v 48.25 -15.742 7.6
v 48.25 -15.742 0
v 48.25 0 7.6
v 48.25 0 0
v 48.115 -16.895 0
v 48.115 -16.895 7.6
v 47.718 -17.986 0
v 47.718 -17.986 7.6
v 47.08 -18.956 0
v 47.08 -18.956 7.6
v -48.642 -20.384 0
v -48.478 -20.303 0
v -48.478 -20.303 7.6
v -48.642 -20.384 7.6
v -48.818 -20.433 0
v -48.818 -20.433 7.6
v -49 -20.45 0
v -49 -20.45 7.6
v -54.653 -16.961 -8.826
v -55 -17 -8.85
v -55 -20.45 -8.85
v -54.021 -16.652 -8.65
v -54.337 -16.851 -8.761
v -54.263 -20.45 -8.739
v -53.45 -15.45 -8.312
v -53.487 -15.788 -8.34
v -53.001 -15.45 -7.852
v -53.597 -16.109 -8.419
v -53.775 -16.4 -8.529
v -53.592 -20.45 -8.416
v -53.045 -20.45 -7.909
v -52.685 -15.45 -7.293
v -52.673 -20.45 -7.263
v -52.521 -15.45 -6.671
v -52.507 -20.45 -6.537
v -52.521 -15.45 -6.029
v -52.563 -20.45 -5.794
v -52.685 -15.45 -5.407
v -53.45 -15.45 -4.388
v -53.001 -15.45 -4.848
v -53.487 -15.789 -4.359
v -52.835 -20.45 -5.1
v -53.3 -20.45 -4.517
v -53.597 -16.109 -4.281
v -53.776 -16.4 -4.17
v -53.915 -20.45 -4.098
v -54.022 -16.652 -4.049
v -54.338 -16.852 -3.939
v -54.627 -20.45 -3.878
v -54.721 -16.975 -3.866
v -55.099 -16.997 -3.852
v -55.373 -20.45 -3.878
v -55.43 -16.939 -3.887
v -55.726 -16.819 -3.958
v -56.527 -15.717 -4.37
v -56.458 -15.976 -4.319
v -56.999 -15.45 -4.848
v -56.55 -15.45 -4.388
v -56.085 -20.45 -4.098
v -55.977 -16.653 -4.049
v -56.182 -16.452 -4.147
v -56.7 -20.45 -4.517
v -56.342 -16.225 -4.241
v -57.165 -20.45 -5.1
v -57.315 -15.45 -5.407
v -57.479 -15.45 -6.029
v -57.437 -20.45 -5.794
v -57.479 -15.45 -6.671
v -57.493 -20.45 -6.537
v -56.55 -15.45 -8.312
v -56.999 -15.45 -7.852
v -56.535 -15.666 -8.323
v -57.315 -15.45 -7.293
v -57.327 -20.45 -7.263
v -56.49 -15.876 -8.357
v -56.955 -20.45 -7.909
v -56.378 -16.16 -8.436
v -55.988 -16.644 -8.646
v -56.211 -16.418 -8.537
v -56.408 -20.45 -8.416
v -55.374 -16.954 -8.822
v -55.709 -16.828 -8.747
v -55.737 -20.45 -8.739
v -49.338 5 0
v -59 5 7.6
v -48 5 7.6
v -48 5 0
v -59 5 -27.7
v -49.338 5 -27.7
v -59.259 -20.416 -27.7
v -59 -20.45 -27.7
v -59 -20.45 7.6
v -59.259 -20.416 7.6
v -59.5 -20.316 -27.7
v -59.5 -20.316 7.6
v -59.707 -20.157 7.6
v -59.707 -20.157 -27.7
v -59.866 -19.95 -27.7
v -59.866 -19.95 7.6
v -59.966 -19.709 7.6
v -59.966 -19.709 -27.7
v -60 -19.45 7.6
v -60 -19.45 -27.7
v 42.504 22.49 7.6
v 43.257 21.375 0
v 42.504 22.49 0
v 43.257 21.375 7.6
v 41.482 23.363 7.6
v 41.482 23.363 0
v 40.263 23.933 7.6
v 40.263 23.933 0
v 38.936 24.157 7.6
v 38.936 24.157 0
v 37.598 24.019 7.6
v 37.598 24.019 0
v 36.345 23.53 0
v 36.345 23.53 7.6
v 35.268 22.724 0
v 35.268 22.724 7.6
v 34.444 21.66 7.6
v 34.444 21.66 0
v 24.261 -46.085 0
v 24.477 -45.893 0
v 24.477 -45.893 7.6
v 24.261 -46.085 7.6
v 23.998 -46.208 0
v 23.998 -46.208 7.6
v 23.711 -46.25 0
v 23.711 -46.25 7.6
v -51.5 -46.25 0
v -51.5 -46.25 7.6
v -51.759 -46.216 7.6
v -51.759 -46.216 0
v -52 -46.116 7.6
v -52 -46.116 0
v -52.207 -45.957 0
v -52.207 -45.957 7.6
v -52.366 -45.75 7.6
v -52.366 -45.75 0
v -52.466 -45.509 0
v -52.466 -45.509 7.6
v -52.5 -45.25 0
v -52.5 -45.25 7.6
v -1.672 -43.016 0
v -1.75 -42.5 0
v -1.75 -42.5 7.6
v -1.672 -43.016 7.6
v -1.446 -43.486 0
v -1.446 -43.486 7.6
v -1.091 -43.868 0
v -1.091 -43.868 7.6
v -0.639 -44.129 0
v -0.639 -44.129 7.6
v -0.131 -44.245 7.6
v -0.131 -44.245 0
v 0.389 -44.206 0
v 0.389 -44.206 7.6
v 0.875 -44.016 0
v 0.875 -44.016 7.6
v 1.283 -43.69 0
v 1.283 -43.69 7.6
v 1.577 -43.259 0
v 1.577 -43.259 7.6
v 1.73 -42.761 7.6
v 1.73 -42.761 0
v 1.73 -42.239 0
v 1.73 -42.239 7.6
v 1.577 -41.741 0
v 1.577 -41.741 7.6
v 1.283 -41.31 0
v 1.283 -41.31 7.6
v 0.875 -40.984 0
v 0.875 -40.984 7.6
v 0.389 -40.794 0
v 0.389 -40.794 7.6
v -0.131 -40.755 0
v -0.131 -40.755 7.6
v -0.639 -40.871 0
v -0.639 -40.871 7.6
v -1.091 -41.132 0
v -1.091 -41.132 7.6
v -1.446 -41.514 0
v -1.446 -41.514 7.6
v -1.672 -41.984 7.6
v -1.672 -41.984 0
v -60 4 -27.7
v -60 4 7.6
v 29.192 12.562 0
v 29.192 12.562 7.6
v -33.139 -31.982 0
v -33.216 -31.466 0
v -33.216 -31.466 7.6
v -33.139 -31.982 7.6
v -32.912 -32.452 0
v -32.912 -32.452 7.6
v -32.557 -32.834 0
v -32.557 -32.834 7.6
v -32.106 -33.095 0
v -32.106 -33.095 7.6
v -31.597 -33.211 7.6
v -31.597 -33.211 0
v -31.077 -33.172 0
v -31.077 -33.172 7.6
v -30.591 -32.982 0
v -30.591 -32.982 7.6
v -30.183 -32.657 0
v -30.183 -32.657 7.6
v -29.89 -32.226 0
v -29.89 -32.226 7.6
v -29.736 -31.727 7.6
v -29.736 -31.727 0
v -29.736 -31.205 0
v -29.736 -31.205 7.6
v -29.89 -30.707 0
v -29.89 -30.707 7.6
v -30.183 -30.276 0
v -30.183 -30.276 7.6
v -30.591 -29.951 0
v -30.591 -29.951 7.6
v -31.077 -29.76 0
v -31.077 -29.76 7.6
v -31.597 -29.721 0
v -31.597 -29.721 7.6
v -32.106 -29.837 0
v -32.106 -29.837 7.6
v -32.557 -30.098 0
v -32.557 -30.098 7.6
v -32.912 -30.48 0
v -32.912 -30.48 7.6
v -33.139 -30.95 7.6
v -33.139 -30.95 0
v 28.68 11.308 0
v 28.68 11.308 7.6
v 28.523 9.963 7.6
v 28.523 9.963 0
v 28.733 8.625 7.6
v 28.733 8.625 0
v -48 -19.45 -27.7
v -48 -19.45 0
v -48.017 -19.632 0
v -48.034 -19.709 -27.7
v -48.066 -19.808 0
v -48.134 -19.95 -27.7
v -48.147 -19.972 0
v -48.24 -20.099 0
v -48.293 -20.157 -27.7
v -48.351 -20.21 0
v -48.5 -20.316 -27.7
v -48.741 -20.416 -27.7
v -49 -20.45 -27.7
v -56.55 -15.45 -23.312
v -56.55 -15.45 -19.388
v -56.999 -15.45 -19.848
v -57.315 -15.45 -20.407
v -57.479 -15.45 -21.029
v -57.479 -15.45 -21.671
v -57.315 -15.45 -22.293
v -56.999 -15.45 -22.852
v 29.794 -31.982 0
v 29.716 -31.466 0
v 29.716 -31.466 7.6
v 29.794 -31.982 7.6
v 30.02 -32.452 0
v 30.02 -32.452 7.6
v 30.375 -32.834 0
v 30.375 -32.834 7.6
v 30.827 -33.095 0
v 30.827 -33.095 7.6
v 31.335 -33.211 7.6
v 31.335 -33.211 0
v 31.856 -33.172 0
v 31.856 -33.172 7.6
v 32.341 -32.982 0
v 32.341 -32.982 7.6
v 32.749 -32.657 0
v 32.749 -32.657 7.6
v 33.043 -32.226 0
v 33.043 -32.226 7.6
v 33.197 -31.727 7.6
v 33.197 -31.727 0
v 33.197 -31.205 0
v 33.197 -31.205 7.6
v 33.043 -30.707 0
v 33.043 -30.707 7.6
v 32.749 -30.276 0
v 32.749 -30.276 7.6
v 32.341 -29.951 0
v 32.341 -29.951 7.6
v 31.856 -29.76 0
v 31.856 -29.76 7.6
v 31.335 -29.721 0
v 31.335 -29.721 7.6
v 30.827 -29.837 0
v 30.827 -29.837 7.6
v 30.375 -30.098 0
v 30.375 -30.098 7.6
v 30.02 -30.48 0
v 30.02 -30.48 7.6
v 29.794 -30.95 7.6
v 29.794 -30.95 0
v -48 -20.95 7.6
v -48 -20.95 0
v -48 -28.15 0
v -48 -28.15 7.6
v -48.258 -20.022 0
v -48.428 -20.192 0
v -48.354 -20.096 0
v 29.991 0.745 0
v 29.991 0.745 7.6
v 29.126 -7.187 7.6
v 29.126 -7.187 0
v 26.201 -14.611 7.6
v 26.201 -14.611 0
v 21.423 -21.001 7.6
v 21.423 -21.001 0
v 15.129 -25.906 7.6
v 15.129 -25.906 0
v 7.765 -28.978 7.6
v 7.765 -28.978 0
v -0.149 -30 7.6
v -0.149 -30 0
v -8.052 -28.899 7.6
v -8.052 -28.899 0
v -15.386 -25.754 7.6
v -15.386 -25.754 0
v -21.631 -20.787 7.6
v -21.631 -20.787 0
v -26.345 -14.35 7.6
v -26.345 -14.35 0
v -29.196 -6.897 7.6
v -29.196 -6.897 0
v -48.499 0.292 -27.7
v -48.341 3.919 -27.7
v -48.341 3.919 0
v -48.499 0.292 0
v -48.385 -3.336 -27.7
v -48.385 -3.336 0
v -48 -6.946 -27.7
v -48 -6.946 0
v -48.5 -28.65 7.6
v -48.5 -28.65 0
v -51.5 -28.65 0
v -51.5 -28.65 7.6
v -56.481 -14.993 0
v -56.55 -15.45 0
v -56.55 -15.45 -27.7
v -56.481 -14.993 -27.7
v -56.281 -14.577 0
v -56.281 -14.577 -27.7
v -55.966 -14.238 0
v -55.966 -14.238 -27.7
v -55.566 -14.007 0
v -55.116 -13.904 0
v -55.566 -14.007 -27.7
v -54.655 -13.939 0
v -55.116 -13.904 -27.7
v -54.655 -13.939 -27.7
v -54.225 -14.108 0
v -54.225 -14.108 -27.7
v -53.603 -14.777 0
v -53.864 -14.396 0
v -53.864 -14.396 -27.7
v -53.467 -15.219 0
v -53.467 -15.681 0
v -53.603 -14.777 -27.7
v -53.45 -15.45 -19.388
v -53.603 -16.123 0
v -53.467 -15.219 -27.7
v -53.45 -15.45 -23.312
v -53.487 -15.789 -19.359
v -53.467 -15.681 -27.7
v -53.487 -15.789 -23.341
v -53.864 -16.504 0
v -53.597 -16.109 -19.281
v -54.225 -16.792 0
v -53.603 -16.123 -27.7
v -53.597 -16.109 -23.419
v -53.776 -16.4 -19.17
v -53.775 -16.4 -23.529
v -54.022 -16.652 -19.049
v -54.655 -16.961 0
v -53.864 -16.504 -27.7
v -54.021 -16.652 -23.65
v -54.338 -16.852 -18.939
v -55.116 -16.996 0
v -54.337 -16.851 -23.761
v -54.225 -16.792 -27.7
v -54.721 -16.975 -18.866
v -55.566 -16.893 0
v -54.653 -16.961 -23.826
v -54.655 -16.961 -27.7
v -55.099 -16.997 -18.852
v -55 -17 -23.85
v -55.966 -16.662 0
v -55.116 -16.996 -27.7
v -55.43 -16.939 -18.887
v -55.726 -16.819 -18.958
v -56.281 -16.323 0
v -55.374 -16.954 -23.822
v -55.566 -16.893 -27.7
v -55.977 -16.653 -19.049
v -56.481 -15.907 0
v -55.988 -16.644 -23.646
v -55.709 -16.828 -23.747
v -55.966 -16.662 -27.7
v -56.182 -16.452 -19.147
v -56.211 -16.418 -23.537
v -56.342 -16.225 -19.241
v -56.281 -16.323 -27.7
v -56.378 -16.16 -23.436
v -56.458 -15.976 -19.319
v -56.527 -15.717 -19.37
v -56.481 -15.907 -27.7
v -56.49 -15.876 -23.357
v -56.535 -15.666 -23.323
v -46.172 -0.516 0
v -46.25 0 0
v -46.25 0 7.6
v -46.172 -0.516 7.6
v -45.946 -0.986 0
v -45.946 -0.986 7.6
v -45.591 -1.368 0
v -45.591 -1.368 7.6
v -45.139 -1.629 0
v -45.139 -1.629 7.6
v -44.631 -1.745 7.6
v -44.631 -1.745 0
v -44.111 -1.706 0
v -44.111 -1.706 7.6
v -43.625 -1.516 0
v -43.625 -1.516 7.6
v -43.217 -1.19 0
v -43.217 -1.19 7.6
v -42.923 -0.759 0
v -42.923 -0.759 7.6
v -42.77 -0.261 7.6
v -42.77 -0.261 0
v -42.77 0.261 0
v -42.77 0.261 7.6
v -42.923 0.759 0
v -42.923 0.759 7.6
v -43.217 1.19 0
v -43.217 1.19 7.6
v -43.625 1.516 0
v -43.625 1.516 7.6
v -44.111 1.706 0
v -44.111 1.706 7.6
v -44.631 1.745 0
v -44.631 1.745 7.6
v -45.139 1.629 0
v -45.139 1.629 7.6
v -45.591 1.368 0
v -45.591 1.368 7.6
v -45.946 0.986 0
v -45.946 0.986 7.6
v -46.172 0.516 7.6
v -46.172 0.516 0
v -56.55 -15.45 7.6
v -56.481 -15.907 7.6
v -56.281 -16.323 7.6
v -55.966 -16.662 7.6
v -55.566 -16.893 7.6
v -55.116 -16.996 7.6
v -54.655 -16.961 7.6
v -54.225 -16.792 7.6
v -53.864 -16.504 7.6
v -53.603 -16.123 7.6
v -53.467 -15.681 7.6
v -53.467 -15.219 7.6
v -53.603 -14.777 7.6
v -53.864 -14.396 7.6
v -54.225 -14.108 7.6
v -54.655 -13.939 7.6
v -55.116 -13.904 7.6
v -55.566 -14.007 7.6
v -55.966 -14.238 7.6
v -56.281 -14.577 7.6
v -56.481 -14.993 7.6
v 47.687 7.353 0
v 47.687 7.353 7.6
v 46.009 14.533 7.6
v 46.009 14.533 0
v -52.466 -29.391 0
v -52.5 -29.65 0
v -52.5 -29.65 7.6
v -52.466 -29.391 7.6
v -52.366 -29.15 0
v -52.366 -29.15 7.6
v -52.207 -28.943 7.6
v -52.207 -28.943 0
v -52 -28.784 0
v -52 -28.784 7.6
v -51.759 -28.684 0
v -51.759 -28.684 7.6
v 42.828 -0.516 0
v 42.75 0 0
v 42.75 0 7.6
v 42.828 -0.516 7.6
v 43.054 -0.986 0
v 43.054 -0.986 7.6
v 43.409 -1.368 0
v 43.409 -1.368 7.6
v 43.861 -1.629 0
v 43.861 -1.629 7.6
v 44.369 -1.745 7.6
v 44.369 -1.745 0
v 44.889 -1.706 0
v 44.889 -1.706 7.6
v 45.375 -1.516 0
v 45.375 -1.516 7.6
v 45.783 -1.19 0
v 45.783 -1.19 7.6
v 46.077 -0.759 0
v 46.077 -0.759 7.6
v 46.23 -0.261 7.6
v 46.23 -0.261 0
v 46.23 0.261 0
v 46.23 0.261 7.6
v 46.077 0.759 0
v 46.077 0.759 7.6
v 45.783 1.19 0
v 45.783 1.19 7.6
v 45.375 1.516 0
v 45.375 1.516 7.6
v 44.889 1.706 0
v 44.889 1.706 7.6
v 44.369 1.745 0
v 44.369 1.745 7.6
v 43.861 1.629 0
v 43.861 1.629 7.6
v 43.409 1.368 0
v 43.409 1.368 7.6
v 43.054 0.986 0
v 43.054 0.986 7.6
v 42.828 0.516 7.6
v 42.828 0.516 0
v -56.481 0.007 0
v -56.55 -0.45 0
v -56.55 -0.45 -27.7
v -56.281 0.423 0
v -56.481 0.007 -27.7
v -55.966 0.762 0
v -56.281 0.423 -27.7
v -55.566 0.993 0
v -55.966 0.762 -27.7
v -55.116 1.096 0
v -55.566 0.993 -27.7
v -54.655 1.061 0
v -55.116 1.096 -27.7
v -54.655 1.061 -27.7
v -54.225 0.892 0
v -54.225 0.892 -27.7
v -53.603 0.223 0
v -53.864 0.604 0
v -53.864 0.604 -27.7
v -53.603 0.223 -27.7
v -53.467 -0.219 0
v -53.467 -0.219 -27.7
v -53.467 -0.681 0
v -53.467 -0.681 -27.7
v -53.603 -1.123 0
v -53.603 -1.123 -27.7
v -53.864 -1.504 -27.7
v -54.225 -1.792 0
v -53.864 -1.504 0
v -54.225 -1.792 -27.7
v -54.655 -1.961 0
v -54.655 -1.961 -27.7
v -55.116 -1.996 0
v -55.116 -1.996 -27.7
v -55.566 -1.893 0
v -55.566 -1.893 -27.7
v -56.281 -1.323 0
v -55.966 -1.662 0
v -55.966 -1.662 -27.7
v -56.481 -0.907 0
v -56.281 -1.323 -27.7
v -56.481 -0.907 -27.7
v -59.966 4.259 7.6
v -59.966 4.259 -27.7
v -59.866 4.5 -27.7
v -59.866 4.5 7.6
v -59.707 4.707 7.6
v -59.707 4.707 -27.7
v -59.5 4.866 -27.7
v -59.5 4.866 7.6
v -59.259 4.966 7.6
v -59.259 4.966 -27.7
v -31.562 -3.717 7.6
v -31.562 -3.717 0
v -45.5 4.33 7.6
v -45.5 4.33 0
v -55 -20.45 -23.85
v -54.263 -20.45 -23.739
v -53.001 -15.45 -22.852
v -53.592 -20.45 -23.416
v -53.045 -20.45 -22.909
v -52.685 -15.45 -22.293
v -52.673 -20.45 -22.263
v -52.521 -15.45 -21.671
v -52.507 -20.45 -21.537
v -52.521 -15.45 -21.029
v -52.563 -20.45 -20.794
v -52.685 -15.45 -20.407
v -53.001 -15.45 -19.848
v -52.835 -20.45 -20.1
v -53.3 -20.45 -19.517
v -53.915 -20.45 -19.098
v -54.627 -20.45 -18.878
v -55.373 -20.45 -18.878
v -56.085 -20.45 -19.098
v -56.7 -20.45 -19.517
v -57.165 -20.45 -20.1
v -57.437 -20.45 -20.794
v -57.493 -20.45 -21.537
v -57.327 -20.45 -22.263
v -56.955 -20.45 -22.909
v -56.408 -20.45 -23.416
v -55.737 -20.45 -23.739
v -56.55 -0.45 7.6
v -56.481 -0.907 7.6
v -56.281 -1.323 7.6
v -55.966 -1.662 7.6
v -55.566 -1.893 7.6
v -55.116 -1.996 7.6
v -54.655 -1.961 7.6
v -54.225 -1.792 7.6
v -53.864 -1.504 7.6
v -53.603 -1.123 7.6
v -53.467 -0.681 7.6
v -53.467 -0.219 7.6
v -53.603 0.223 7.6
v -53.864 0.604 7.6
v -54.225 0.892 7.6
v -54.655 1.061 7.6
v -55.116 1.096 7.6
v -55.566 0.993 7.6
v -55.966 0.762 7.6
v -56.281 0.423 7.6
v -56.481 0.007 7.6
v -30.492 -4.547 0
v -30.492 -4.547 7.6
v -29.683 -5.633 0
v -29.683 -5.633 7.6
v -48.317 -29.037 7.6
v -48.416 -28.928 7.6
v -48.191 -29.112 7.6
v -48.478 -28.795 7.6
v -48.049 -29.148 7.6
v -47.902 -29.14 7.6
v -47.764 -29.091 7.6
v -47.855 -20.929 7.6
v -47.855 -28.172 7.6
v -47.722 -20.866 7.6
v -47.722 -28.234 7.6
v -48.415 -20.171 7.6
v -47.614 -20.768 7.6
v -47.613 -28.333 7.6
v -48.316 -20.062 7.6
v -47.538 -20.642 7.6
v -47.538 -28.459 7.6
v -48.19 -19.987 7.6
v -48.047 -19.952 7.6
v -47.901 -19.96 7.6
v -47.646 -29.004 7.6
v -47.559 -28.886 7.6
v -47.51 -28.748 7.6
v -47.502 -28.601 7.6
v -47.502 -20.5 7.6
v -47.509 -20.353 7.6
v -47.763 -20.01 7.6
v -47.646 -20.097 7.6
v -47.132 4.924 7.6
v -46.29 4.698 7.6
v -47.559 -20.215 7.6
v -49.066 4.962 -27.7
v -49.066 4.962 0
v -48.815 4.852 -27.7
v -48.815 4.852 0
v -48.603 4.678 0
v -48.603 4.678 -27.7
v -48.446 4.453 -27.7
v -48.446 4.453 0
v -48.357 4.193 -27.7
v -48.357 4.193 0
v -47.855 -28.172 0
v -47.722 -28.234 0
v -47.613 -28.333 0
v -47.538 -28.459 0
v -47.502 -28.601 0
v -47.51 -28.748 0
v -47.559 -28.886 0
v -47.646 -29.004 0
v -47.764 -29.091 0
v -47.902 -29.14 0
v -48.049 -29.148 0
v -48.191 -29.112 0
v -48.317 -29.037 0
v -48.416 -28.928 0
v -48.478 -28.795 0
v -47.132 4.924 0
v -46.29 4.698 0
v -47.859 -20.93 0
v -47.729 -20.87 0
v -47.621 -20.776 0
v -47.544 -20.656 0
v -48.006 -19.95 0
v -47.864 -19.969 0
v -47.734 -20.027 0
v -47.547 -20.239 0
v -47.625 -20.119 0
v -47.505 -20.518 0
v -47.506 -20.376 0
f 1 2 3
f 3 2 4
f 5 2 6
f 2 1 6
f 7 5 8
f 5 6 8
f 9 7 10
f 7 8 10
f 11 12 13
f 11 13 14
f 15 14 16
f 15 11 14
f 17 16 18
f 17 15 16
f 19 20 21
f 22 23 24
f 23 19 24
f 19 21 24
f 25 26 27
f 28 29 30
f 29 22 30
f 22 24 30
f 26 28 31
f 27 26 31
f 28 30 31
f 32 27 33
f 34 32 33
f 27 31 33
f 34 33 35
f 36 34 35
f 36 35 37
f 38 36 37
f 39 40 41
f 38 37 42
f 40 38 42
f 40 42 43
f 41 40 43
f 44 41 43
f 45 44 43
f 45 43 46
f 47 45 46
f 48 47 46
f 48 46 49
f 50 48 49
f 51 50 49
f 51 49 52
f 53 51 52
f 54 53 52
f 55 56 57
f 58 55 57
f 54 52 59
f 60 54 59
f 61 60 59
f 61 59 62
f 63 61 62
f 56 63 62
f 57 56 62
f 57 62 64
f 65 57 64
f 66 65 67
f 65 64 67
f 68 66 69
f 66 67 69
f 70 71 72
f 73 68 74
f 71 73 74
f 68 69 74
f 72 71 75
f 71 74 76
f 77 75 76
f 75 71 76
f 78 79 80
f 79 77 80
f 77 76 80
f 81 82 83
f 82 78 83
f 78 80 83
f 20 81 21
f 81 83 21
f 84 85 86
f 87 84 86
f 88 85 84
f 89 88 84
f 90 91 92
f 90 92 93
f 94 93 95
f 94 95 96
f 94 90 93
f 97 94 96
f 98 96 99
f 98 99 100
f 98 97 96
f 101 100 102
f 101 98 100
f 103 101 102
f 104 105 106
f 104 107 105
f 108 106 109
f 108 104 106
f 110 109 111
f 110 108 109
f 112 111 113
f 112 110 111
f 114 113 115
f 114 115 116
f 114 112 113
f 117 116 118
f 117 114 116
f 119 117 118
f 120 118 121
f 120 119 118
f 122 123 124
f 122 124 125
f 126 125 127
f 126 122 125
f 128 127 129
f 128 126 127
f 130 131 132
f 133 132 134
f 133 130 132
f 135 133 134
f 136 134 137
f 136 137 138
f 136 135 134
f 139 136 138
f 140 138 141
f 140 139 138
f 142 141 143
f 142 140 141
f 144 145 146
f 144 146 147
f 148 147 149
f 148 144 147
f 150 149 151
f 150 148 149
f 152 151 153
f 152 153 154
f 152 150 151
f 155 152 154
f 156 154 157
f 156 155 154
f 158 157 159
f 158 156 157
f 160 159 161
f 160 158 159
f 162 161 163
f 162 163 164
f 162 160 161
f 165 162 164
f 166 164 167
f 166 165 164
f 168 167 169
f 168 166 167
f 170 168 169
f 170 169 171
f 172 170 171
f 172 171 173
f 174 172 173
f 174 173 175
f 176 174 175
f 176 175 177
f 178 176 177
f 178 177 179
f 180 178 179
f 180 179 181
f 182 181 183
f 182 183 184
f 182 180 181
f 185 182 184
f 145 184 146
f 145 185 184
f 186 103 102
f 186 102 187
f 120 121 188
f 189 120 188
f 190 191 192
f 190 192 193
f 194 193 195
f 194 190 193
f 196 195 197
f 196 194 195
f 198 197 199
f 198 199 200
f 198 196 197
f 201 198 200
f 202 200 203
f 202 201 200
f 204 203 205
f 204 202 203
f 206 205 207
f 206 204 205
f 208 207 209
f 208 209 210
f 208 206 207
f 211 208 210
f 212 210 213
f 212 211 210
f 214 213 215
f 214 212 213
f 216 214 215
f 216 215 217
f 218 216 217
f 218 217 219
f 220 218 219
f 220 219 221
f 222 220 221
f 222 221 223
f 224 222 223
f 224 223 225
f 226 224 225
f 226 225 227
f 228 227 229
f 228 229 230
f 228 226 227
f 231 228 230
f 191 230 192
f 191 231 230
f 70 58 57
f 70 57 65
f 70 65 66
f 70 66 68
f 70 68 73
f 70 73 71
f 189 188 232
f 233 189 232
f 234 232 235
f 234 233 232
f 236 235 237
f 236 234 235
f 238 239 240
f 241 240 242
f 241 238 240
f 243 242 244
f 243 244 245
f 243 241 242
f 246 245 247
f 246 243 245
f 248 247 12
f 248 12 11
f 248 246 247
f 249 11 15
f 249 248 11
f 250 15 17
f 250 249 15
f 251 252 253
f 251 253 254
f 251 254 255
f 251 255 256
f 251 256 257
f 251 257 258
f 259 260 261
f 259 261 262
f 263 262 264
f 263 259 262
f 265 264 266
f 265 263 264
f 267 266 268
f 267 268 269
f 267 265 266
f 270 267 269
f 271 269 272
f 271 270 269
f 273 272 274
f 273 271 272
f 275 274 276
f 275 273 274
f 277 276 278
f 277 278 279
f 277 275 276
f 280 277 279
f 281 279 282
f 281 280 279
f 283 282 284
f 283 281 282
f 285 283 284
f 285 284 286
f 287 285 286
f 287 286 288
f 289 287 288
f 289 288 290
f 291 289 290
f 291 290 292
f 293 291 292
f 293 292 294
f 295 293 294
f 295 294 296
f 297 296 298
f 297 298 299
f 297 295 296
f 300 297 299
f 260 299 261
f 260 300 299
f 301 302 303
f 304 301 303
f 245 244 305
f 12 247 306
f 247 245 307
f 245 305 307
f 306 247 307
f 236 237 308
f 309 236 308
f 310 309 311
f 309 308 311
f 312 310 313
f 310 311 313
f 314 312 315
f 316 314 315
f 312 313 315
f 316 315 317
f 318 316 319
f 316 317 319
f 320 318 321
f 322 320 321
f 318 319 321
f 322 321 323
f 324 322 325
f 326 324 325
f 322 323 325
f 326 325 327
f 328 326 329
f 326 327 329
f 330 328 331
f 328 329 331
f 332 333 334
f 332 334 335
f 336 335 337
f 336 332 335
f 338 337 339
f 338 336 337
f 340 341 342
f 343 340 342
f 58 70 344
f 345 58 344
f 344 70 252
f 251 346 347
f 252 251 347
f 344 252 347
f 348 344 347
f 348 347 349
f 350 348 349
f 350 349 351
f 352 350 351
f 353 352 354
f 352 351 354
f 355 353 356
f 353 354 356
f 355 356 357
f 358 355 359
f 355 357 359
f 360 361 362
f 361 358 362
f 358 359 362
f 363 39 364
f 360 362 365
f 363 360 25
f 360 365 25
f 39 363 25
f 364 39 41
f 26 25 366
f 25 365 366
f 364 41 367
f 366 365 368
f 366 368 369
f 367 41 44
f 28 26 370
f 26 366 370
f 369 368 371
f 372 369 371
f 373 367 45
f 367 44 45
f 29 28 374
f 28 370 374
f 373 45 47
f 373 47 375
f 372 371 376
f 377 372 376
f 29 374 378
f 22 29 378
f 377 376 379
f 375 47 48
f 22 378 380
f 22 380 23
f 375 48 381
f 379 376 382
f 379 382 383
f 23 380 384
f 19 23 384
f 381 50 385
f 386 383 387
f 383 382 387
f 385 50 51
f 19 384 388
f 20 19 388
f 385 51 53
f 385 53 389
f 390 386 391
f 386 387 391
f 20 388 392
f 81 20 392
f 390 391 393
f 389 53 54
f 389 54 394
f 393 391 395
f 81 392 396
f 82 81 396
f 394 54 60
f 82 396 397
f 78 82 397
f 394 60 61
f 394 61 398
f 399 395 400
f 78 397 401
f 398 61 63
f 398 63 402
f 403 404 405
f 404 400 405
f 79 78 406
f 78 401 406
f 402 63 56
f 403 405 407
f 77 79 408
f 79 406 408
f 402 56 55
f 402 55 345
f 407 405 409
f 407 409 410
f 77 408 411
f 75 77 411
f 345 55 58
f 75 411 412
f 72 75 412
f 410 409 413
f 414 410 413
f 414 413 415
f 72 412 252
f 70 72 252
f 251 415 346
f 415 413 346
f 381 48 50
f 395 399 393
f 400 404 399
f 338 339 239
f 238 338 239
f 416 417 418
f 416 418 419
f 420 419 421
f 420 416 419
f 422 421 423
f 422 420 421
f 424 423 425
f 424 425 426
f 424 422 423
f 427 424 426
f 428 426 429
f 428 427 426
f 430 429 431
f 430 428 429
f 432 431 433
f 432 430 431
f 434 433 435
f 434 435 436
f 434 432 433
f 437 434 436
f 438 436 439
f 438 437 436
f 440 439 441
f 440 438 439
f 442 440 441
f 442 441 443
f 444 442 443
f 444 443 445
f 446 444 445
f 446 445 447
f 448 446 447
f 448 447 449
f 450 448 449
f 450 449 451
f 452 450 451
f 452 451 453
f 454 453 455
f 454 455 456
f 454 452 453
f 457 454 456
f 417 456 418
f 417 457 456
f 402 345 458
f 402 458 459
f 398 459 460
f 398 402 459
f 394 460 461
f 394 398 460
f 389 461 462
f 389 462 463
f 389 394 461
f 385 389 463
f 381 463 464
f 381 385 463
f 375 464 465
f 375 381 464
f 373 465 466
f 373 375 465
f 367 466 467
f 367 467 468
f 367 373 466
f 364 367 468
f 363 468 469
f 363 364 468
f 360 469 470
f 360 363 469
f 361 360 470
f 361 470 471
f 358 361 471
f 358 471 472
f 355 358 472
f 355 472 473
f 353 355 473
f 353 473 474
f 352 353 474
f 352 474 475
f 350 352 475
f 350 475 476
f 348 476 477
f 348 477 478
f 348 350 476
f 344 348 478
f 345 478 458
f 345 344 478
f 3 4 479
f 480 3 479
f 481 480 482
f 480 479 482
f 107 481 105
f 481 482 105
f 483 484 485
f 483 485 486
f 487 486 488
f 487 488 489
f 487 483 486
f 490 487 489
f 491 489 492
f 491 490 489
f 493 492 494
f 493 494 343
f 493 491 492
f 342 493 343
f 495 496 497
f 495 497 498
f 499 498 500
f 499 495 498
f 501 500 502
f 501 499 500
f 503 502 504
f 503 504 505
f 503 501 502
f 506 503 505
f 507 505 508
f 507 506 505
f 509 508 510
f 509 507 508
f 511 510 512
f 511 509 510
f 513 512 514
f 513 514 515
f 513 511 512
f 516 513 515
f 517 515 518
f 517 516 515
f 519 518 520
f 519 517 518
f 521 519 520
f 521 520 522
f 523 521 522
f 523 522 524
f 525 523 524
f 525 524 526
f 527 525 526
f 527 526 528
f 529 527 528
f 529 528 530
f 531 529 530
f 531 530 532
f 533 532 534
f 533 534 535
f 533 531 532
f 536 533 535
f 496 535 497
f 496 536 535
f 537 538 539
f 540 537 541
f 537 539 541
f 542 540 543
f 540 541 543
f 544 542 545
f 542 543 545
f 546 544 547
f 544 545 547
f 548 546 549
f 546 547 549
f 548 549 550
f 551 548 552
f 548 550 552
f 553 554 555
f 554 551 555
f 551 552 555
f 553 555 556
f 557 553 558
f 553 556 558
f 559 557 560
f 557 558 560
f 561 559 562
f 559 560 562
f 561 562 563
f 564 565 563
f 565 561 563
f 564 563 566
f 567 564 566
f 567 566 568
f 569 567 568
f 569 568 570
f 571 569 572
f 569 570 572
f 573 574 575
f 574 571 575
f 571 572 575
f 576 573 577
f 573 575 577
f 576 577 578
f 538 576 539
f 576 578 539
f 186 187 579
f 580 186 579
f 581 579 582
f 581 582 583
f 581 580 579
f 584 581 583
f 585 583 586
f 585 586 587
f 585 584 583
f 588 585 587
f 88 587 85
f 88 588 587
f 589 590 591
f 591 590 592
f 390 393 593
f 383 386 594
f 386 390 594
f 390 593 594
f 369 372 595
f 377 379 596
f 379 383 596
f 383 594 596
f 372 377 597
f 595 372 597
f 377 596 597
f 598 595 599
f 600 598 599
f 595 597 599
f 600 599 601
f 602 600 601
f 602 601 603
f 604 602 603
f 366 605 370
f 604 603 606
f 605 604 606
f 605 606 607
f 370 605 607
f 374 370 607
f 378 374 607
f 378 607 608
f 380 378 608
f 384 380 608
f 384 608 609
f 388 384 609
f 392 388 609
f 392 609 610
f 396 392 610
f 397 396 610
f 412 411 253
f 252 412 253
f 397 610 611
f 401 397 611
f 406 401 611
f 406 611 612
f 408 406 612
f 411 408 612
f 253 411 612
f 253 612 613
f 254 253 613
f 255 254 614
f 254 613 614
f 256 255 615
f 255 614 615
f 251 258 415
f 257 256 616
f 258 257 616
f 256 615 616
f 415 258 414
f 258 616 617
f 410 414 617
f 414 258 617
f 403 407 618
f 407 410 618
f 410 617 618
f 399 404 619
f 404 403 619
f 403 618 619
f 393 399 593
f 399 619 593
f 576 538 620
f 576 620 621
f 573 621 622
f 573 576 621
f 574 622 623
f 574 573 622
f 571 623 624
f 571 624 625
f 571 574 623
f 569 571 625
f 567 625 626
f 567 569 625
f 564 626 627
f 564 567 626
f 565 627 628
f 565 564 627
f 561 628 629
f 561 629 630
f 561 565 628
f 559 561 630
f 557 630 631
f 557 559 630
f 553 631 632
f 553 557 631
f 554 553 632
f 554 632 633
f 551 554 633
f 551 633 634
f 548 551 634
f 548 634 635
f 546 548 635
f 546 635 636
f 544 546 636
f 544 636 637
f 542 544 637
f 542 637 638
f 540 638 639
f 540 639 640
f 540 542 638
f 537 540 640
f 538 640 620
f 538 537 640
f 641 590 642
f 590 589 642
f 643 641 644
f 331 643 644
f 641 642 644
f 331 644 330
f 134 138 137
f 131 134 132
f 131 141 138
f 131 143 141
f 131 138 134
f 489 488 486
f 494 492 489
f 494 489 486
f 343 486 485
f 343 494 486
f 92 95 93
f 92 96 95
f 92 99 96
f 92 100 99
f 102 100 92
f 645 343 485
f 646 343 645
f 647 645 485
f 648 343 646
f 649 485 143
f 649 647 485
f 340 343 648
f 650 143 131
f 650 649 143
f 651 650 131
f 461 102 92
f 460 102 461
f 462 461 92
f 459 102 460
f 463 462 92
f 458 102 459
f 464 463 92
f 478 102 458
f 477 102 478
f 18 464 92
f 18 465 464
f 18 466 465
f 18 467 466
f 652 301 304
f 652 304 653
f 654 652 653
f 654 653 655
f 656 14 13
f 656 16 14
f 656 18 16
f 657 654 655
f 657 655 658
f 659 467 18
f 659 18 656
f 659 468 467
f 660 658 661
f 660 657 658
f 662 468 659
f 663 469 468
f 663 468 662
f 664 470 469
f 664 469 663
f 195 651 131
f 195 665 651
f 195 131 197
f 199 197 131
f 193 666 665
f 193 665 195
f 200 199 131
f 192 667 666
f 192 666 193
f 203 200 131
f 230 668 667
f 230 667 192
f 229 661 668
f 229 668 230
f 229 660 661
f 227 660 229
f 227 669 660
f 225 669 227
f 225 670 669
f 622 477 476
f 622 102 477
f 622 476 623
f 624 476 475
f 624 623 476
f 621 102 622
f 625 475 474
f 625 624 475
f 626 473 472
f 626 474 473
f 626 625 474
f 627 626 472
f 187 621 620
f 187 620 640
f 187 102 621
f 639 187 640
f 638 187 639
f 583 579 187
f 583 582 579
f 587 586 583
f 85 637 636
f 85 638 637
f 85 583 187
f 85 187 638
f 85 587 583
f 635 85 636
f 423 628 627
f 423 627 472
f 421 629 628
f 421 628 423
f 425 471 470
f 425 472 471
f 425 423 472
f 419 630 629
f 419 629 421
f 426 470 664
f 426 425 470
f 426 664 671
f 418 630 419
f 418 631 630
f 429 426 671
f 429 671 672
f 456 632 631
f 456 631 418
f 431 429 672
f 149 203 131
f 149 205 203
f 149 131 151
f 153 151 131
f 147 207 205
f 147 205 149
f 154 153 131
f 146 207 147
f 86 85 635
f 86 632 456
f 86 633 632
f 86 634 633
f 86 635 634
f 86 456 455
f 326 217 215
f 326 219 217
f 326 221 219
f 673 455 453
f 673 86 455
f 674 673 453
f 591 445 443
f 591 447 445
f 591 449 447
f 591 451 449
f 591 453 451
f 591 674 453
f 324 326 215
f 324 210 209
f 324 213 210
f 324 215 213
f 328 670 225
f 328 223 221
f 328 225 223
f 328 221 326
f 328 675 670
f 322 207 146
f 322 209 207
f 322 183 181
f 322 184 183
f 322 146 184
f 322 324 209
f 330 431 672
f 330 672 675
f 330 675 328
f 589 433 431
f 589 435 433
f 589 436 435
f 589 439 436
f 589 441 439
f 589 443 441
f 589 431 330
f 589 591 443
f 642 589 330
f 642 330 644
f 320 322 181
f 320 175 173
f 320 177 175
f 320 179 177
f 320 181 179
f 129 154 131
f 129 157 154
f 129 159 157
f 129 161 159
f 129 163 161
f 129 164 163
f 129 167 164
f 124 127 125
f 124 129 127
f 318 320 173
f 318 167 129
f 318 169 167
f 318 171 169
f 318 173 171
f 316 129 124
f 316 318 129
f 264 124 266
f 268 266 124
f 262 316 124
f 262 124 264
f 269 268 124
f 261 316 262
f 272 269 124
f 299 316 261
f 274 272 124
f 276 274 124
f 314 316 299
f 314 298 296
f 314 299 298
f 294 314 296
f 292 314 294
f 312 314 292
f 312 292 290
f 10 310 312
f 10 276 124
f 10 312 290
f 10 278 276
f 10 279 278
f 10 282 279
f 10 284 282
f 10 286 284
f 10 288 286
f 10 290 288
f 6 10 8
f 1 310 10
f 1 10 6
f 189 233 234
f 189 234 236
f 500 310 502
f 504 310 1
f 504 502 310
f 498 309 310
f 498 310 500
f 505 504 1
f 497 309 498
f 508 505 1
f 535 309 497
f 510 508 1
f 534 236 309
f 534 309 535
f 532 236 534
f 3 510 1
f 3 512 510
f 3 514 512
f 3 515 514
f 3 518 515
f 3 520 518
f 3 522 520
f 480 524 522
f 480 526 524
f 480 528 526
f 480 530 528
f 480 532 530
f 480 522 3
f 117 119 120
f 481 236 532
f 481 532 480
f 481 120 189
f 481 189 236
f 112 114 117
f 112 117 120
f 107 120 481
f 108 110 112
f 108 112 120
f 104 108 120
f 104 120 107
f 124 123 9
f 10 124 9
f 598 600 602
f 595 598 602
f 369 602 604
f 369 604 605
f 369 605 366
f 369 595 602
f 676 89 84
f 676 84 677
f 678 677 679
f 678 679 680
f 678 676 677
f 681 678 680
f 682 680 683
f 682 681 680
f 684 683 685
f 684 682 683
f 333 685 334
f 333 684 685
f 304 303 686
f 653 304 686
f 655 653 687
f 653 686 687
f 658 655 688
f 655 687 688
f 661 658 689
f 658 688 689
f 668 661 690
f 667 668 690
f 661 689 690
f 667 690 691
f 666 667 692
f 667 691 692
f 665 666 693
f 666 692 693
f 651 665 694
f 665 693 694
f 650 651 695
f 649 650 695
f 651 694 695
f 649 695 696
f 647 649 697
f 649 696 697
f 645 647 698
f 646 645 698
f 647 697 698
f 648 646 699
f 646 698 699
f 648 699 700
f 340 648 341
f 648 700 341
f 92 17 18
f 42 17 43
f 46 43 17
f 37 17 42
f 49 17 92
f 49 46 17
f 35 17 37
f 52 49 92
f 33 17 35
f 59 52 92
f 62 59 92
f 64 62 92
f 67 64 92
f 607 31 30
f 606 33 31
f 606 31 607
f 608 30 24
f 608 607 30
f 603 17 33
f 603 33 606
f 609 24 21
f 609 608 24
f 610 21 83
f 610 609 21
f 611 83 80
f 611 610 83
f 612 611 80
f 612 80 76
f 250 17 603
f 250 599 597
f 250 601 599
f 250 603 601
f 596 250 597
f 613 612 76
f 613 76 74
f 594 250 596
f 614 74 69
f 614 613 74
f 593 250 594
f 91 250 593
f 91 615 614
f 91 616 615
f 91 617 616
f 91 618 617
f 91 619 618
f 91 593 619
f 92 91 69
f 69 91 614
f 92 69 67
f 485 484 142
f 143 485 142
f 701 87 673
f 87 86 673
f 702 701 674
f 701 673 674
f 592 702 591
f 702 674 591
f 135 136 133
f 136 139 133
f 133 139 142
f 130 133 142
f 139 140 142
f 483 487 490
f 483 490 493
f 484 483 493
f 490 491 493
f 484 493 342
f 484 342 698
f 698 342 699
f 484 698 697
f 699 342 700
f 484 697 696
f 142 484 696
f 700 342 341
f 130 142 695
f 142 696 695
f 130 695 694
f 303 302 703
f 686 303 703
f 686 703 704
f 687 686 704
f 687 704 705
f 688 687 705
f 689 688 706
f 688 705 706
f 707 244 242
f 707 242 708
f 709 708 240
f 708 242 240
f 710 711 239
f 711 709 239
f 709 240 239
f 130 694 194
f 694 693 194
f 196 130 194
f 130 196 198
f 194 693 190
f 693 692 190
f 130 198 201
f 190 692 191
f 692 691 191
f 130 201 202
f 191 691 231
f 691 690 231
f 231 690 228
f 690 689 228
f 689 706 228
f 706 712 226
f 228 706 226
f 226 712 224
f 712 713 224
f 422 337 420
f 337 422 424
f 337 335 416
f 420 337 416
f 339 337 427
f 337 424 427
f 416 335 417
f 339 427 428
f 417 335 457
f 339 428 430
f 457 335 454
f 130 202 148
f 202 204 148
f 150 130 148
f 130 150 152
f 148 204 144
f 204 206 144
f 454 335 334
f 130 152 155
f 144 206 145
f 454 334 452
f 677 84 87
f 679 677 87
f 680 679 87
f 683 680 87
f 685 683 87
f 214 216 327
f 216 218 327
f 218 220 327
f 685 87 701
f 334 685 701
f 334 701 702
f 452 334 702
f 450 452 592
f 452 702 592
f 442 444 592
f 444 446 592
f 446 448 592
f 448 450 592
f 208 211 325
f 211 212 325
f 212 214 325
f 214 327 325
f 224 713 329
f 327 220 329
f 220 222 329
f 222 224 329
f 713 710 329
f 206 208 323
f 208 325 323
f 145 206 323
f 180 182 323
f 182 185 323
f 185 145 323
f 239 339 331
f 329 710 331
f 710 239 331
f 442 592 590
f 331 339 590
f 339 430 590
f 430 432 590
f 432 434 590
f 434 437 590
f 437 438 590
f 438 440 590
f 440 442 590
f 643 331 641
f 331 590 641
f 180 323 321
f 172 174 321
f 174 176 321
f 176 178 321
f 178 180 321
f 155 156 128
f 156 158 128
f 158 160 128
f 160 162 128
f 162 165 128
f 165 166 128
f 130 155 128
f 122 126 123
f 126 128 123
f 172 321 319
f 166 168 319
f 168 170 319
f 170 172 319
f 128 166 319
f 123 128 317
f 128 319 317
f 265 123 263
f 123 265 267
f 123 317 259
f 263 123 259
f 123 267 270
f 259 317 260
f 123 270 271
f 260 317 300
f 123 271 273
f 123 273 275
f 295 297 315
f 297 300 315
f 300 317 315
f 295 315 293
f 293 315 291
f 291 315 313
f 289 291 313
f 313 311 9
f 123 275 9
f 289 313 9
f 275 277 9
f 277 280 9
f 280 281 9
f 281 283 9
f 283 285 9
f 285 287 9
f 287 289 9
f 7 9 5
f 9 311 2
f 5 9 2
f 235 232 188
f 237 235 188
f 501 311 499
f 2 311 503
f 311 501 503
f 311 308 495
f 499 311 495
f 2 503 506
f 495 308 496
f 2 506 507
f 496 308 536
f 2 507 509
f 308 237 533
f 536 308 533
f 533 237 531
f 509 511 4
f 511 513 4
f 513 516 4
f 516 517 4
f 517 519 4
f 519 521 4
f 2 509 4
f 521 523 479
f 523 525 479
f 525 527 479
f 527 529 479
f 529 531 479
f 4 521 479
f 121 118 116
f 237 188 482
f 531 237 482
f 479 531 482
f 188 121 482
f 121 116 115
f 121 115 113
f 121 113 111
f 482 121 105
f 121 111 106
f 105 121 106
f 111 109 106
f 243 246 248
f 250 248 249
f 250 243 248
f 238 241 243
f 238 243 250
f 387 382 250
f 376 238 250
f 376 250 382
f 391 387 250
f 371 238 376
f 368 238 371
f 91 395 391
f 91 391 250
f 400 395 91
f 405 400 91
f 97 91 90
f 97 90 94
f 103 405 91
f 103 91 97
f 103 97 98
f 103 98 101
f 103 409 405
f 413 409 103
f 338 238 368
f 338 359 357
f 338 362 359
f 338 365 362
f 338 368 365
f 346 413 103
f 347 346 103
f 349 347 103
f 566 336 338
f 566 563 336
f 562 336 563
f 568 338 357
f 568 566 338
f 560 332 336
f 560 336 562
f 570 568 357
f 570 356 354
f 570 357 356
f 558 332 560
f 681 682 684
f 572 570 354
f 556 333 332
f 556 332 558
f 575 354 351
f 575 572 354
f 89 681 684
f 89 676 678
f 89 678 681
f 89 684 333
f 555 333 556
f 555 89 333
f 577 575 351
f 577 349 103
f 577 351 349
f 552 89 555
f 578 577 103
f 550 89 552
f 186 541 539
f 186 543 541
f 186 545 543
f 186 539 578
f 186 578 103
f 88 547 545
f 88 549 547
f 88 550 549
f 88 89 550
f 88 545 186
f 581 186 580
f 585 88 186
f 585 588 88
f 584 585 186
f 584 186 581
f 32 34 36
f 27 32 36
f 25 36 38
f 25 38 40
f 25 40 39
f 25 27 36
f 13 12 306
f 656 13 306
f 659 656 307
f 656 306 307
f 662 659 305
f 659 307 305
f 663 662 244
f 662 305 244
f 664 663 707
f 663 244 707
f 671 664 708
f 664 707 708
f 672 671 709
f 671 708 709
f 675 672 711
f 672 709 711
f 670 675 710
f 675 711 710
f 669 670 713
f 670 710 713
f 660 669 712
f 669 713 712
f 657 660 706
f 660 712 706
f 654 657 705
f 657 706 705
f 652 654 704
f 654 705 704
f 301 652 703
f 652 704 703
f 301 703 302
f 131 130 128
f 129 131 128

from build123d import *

# Parameters (mm, degrees)
SKETCH_1_R          = 1.75
SKETCH_1_R_2        = 1.55
EXTRUDE_1_DEPTH     = 7.6
SKETCH_2_R          = 0.5
CUT_EXTRUDE_1_DEPTH = 10
FILLET_1_R          = 5
EXTRUDE_START       = 27.7
SKETCH_4_R          = 1.55
EXTRUDE_2_DEPTH     = 27.7
SKETCH_6_R          = 2.5
CUT_EXTRUDE_2_DEPTH = 5
FILLET_START        = -29
FILLET_2_DEPTH      = 29
FILLET_2_2_DEPTH    = 9


with BuildPart() as part:
    # 草图1 → 凸台-拉伸1 (new body)
    with BuildSketch(Plane.XY):
        with BuildLine():
            Line((48.25, -17.561563803), (48.25, 0))
            ThreePointArc((48.25, 0), (45.781945765, 15.234038926), (38.630271835, 28.909593528))
            Line((38.630271835, 28.909593528), (28.062669438, 10.605969263))
            ThreePointArc((28.062669438, 10.605969263), (7.764571353, -28.977774789), (-29.605969263, -4.846295906))
            Line((-29.605969263, -4.846295906), (-46.660254038, 5))
            Line((-46.660254038, 5), (-60, 5))
            Line((-60, 5), (-60, -20.45))
            Line((-60, -20.45), (-48, -20.45))
            Line((-48, -20.45), (-48, -28.65))
            Line((-48, -28.65), (-52.5, -28.65))
            Line((-52.5, -28.65), (-52.5, -46.25))
            Line((-52.5, -46.25), (24.177543768, -46.25))
            Line((24.177543768, -46.25), (48.25, -17.561563803))
        make_face()
        with Locations(Location((-31.466251763, -31.466251763, 0), (0, 0, 180))):
            Circle(SKETCH_1_R, mode=Mode.SUBTRACT)
        with Locations(Location((-55, -15.45, 0), (0, 0, 180))):
            Circle(SKETCH_1_R_2, mode=Mode.SUBTRACT)
        with Locations(Location((0, -42.5, 0), (0, 0, 180))):
            Circle(SKETCH_1_R, mode=Mode.SUBTRACT)
        with Locations(Location((31.466251763, -31.466251763, 0), (0, 0, 180))):
            Circle(SKETCH_1_R, mode=Mode.SUBTRACT)
        with Locations(Location((-55, -0.45, 0), (0, 0, 180))):
            Circle(SKETCH_1_R_2, mode=Mode.SUBTRACT)
        with Locations(Location((-44.5, 0, 0), (0, 0, 180))):
            Circle(SKETCH_1_R, mode=Mode.SUBTRACT)
        with Locations(Location((44.5, 0, 0), (0, 0, 180))):
            Circle(SKETCH_1_R, mode=Mode.SUBTRACT)
    extrude(amount=EXTRUDE_1_DEPTH)

    # 草图2 → 切除-拉伸1 (cut)
    with BuildSketch(Plane(origin=(0, 0, 0), x_dir=(-1, 0, 0), z_dir=(0, 0, -1))):
        with Locations((48, -20.45)):
            Circle(SKETCH_2_R)
        with Locations((48, -28.65)):
            Circle(SKETCH_2_R)
    extrude(amount=-CUT_EXTRUDE_1_DEPTH, mode=Mode.SUBTRACT)

    # 圆角1
    fillet_1_edges = [part.edges().sort_by_distance(p)[0] for p in [
        (48.25, -17.561563803, 3.8),
        (-46.660254038, 5, 3.8),
        (-29.605969263, -4.846295906, 3.8),
        (28.062669438, 10.605969263, 3.8),
        (38.630271835, 28.909593528, 3.8),
    ]]
    fillet(fillet_1_edges, radius=FILLET_1_R)

    # 草图4 → 凸台-拉伸2 (add)
    with BuildSketch(Plane(origin=(0, 0, 0), x_dir=(-1, 0, 0), z_dir=(0, 0, -1)).offset(EXTRUDE_START)):
        with BuildLine():
            Line((60, 5), (48.241579576, 5))
            ThreePointArc((48.241579576, 5), (48.490086253, -0.980579006), (48, -6.946221995))
            Line((48, -6.946221995), (48, -20.45))
            Line((48, -20.45), (60, -20.45))
            Line((60, -20.45), (60, 5))
        make_face()
        with Locations((55, -15.45)):
            Circle(SKETCH_4_R, mode=Mode.SUBTRACT)
        with Locations((55, -0.45)):
            Circle(SKETCH_4_R, mode=Mode.SUBTRACT)
    extrude(amount=-EXTRUDE_2_DEPTH)

    # 草图6 → 切除-拉伸2 (cut)
    with BuildSketch(Plane.XZ.offset(20.45)):
        with Locations(Location((-55, -21.35, 0), (0, 0, 270))):
            Circle(SKETCH_6_R)
        with Locations(Location((-55, -6.35, 0), (0, 0, 270))):
            Circle(SKETCH_6_R)
    extrude(amount=-CUT_EXTRUDE_2_DEPTH, mode=Mode.SUBTRACT)

    # 圆角2: read off the stored shape, not the designer's step
    # 圆角2 outline → 圆角2 (cut)
    with BuildSketch(Plane.XY.offset(FILLET_START)):
        with BuildLine():
            Line((-49, -20.45), (-48, -20.45))
            Line((-48, -20.45), (-48, -19.45))
            ThreePointArc((-48, -19.45), (-48.292893219, -20.157106781), (-49, -20.45))
        make_face()
        with BuildLine():
            Line((-60, -20.45), (-59, -20.45))
            ThreePointArc((-59, -20.45), (-59.707106781, -20.157106781), (-60, -19.45))
            Line((-60, -19.45), (-60, -20.45))
        make_face()
        with BuildLine():
            Line((-60, 5), (-60, 4))
            ThreePointArc((-60, 4), (-59.707106781, 4.707106781), (-59, 5))
            Line((-59, 5), (-60, 5))
        make_face()
        with BuildLine():
            ThreePointArc((-49.338119137, 5), (-48.602997351, 4.67793507), (-48.341389458, 3.919191919))
            ThreePointArc((-48.341389458, 3.919191919), (-48.294508108, 4.45987518), (-48.241579576, 5))
            Line((-48.241579576, 5), (-49.338119137, 5))
        make_face()
    extrude(amount=FILLET_2_DEPTH, mode=Mode.SUBTRACT)

    # Fillet 2 2 outline → Fillet 2 2 (cut)
    with BuildSketch(Plane.XY):
        with BuildLine():
            ThreePointArc((-48.477859457, -20.302859457), (-48.728761597, -20.412512196), (-49, -20.45))
            Line((-49, -20.45), (-48.5, -20.45))
            ThreePointArc((-48.5, -20.45), (-48.494433883, -20.375601507), (-48.477859457, -20.302859457))
        make_face()
        with BuildLine():
            Line((-60, -20.45), (-59, -20.45))
            ThreePointArc((-59, -20.45), (-59.707106781, -20.157106781), (-60, -19.45))
            Line((-60, -19.45), (-60, -20.45))
        make_face()
        with BuildLine():
            Line((-60, 5), (-60, 4))
            ThreePointArc((-60, 4), (-59.707106781, 4.707106781), (-59, 5))
            Line((-59, 5), (-60, 5))
        make_face()
        with BuildLine():
            Line((-52.5, -28.65), (-52.5, -29.65))
            ThreePointArc((-52.5, -29.65), (-52.207106781, -28.942893219), (-51.5, -28.65))
            Line((-51.5, -28.65), (-52.5, -28.65))
        make_face()
        with BuildLine():
            Line((-52.5, -46.25), (-51.5, -46.25))
            ThreePointArc((-51.5, -46.25), (-52.207106781, -45.957106781), (-52.5, -45.25))
            Line((-52.5, -45.25), (-52.5, -46.25))
        make_face()
        with BuildLine():
            ThreePointArc((24.477280553, -45.89278761), (24.133854372, -46.156307787), (23.71123611, -46.25))
            Line((23.71123611, -46.25), (24.177543768, -46.25))
            Line((24.177543768, -46.25), (24.477280553, -45.89278761))
        make_face()
    extrude(amount=FILLET_2_2_DEPTH, mode=Mode.SUBTRACT)


solid = part.part
